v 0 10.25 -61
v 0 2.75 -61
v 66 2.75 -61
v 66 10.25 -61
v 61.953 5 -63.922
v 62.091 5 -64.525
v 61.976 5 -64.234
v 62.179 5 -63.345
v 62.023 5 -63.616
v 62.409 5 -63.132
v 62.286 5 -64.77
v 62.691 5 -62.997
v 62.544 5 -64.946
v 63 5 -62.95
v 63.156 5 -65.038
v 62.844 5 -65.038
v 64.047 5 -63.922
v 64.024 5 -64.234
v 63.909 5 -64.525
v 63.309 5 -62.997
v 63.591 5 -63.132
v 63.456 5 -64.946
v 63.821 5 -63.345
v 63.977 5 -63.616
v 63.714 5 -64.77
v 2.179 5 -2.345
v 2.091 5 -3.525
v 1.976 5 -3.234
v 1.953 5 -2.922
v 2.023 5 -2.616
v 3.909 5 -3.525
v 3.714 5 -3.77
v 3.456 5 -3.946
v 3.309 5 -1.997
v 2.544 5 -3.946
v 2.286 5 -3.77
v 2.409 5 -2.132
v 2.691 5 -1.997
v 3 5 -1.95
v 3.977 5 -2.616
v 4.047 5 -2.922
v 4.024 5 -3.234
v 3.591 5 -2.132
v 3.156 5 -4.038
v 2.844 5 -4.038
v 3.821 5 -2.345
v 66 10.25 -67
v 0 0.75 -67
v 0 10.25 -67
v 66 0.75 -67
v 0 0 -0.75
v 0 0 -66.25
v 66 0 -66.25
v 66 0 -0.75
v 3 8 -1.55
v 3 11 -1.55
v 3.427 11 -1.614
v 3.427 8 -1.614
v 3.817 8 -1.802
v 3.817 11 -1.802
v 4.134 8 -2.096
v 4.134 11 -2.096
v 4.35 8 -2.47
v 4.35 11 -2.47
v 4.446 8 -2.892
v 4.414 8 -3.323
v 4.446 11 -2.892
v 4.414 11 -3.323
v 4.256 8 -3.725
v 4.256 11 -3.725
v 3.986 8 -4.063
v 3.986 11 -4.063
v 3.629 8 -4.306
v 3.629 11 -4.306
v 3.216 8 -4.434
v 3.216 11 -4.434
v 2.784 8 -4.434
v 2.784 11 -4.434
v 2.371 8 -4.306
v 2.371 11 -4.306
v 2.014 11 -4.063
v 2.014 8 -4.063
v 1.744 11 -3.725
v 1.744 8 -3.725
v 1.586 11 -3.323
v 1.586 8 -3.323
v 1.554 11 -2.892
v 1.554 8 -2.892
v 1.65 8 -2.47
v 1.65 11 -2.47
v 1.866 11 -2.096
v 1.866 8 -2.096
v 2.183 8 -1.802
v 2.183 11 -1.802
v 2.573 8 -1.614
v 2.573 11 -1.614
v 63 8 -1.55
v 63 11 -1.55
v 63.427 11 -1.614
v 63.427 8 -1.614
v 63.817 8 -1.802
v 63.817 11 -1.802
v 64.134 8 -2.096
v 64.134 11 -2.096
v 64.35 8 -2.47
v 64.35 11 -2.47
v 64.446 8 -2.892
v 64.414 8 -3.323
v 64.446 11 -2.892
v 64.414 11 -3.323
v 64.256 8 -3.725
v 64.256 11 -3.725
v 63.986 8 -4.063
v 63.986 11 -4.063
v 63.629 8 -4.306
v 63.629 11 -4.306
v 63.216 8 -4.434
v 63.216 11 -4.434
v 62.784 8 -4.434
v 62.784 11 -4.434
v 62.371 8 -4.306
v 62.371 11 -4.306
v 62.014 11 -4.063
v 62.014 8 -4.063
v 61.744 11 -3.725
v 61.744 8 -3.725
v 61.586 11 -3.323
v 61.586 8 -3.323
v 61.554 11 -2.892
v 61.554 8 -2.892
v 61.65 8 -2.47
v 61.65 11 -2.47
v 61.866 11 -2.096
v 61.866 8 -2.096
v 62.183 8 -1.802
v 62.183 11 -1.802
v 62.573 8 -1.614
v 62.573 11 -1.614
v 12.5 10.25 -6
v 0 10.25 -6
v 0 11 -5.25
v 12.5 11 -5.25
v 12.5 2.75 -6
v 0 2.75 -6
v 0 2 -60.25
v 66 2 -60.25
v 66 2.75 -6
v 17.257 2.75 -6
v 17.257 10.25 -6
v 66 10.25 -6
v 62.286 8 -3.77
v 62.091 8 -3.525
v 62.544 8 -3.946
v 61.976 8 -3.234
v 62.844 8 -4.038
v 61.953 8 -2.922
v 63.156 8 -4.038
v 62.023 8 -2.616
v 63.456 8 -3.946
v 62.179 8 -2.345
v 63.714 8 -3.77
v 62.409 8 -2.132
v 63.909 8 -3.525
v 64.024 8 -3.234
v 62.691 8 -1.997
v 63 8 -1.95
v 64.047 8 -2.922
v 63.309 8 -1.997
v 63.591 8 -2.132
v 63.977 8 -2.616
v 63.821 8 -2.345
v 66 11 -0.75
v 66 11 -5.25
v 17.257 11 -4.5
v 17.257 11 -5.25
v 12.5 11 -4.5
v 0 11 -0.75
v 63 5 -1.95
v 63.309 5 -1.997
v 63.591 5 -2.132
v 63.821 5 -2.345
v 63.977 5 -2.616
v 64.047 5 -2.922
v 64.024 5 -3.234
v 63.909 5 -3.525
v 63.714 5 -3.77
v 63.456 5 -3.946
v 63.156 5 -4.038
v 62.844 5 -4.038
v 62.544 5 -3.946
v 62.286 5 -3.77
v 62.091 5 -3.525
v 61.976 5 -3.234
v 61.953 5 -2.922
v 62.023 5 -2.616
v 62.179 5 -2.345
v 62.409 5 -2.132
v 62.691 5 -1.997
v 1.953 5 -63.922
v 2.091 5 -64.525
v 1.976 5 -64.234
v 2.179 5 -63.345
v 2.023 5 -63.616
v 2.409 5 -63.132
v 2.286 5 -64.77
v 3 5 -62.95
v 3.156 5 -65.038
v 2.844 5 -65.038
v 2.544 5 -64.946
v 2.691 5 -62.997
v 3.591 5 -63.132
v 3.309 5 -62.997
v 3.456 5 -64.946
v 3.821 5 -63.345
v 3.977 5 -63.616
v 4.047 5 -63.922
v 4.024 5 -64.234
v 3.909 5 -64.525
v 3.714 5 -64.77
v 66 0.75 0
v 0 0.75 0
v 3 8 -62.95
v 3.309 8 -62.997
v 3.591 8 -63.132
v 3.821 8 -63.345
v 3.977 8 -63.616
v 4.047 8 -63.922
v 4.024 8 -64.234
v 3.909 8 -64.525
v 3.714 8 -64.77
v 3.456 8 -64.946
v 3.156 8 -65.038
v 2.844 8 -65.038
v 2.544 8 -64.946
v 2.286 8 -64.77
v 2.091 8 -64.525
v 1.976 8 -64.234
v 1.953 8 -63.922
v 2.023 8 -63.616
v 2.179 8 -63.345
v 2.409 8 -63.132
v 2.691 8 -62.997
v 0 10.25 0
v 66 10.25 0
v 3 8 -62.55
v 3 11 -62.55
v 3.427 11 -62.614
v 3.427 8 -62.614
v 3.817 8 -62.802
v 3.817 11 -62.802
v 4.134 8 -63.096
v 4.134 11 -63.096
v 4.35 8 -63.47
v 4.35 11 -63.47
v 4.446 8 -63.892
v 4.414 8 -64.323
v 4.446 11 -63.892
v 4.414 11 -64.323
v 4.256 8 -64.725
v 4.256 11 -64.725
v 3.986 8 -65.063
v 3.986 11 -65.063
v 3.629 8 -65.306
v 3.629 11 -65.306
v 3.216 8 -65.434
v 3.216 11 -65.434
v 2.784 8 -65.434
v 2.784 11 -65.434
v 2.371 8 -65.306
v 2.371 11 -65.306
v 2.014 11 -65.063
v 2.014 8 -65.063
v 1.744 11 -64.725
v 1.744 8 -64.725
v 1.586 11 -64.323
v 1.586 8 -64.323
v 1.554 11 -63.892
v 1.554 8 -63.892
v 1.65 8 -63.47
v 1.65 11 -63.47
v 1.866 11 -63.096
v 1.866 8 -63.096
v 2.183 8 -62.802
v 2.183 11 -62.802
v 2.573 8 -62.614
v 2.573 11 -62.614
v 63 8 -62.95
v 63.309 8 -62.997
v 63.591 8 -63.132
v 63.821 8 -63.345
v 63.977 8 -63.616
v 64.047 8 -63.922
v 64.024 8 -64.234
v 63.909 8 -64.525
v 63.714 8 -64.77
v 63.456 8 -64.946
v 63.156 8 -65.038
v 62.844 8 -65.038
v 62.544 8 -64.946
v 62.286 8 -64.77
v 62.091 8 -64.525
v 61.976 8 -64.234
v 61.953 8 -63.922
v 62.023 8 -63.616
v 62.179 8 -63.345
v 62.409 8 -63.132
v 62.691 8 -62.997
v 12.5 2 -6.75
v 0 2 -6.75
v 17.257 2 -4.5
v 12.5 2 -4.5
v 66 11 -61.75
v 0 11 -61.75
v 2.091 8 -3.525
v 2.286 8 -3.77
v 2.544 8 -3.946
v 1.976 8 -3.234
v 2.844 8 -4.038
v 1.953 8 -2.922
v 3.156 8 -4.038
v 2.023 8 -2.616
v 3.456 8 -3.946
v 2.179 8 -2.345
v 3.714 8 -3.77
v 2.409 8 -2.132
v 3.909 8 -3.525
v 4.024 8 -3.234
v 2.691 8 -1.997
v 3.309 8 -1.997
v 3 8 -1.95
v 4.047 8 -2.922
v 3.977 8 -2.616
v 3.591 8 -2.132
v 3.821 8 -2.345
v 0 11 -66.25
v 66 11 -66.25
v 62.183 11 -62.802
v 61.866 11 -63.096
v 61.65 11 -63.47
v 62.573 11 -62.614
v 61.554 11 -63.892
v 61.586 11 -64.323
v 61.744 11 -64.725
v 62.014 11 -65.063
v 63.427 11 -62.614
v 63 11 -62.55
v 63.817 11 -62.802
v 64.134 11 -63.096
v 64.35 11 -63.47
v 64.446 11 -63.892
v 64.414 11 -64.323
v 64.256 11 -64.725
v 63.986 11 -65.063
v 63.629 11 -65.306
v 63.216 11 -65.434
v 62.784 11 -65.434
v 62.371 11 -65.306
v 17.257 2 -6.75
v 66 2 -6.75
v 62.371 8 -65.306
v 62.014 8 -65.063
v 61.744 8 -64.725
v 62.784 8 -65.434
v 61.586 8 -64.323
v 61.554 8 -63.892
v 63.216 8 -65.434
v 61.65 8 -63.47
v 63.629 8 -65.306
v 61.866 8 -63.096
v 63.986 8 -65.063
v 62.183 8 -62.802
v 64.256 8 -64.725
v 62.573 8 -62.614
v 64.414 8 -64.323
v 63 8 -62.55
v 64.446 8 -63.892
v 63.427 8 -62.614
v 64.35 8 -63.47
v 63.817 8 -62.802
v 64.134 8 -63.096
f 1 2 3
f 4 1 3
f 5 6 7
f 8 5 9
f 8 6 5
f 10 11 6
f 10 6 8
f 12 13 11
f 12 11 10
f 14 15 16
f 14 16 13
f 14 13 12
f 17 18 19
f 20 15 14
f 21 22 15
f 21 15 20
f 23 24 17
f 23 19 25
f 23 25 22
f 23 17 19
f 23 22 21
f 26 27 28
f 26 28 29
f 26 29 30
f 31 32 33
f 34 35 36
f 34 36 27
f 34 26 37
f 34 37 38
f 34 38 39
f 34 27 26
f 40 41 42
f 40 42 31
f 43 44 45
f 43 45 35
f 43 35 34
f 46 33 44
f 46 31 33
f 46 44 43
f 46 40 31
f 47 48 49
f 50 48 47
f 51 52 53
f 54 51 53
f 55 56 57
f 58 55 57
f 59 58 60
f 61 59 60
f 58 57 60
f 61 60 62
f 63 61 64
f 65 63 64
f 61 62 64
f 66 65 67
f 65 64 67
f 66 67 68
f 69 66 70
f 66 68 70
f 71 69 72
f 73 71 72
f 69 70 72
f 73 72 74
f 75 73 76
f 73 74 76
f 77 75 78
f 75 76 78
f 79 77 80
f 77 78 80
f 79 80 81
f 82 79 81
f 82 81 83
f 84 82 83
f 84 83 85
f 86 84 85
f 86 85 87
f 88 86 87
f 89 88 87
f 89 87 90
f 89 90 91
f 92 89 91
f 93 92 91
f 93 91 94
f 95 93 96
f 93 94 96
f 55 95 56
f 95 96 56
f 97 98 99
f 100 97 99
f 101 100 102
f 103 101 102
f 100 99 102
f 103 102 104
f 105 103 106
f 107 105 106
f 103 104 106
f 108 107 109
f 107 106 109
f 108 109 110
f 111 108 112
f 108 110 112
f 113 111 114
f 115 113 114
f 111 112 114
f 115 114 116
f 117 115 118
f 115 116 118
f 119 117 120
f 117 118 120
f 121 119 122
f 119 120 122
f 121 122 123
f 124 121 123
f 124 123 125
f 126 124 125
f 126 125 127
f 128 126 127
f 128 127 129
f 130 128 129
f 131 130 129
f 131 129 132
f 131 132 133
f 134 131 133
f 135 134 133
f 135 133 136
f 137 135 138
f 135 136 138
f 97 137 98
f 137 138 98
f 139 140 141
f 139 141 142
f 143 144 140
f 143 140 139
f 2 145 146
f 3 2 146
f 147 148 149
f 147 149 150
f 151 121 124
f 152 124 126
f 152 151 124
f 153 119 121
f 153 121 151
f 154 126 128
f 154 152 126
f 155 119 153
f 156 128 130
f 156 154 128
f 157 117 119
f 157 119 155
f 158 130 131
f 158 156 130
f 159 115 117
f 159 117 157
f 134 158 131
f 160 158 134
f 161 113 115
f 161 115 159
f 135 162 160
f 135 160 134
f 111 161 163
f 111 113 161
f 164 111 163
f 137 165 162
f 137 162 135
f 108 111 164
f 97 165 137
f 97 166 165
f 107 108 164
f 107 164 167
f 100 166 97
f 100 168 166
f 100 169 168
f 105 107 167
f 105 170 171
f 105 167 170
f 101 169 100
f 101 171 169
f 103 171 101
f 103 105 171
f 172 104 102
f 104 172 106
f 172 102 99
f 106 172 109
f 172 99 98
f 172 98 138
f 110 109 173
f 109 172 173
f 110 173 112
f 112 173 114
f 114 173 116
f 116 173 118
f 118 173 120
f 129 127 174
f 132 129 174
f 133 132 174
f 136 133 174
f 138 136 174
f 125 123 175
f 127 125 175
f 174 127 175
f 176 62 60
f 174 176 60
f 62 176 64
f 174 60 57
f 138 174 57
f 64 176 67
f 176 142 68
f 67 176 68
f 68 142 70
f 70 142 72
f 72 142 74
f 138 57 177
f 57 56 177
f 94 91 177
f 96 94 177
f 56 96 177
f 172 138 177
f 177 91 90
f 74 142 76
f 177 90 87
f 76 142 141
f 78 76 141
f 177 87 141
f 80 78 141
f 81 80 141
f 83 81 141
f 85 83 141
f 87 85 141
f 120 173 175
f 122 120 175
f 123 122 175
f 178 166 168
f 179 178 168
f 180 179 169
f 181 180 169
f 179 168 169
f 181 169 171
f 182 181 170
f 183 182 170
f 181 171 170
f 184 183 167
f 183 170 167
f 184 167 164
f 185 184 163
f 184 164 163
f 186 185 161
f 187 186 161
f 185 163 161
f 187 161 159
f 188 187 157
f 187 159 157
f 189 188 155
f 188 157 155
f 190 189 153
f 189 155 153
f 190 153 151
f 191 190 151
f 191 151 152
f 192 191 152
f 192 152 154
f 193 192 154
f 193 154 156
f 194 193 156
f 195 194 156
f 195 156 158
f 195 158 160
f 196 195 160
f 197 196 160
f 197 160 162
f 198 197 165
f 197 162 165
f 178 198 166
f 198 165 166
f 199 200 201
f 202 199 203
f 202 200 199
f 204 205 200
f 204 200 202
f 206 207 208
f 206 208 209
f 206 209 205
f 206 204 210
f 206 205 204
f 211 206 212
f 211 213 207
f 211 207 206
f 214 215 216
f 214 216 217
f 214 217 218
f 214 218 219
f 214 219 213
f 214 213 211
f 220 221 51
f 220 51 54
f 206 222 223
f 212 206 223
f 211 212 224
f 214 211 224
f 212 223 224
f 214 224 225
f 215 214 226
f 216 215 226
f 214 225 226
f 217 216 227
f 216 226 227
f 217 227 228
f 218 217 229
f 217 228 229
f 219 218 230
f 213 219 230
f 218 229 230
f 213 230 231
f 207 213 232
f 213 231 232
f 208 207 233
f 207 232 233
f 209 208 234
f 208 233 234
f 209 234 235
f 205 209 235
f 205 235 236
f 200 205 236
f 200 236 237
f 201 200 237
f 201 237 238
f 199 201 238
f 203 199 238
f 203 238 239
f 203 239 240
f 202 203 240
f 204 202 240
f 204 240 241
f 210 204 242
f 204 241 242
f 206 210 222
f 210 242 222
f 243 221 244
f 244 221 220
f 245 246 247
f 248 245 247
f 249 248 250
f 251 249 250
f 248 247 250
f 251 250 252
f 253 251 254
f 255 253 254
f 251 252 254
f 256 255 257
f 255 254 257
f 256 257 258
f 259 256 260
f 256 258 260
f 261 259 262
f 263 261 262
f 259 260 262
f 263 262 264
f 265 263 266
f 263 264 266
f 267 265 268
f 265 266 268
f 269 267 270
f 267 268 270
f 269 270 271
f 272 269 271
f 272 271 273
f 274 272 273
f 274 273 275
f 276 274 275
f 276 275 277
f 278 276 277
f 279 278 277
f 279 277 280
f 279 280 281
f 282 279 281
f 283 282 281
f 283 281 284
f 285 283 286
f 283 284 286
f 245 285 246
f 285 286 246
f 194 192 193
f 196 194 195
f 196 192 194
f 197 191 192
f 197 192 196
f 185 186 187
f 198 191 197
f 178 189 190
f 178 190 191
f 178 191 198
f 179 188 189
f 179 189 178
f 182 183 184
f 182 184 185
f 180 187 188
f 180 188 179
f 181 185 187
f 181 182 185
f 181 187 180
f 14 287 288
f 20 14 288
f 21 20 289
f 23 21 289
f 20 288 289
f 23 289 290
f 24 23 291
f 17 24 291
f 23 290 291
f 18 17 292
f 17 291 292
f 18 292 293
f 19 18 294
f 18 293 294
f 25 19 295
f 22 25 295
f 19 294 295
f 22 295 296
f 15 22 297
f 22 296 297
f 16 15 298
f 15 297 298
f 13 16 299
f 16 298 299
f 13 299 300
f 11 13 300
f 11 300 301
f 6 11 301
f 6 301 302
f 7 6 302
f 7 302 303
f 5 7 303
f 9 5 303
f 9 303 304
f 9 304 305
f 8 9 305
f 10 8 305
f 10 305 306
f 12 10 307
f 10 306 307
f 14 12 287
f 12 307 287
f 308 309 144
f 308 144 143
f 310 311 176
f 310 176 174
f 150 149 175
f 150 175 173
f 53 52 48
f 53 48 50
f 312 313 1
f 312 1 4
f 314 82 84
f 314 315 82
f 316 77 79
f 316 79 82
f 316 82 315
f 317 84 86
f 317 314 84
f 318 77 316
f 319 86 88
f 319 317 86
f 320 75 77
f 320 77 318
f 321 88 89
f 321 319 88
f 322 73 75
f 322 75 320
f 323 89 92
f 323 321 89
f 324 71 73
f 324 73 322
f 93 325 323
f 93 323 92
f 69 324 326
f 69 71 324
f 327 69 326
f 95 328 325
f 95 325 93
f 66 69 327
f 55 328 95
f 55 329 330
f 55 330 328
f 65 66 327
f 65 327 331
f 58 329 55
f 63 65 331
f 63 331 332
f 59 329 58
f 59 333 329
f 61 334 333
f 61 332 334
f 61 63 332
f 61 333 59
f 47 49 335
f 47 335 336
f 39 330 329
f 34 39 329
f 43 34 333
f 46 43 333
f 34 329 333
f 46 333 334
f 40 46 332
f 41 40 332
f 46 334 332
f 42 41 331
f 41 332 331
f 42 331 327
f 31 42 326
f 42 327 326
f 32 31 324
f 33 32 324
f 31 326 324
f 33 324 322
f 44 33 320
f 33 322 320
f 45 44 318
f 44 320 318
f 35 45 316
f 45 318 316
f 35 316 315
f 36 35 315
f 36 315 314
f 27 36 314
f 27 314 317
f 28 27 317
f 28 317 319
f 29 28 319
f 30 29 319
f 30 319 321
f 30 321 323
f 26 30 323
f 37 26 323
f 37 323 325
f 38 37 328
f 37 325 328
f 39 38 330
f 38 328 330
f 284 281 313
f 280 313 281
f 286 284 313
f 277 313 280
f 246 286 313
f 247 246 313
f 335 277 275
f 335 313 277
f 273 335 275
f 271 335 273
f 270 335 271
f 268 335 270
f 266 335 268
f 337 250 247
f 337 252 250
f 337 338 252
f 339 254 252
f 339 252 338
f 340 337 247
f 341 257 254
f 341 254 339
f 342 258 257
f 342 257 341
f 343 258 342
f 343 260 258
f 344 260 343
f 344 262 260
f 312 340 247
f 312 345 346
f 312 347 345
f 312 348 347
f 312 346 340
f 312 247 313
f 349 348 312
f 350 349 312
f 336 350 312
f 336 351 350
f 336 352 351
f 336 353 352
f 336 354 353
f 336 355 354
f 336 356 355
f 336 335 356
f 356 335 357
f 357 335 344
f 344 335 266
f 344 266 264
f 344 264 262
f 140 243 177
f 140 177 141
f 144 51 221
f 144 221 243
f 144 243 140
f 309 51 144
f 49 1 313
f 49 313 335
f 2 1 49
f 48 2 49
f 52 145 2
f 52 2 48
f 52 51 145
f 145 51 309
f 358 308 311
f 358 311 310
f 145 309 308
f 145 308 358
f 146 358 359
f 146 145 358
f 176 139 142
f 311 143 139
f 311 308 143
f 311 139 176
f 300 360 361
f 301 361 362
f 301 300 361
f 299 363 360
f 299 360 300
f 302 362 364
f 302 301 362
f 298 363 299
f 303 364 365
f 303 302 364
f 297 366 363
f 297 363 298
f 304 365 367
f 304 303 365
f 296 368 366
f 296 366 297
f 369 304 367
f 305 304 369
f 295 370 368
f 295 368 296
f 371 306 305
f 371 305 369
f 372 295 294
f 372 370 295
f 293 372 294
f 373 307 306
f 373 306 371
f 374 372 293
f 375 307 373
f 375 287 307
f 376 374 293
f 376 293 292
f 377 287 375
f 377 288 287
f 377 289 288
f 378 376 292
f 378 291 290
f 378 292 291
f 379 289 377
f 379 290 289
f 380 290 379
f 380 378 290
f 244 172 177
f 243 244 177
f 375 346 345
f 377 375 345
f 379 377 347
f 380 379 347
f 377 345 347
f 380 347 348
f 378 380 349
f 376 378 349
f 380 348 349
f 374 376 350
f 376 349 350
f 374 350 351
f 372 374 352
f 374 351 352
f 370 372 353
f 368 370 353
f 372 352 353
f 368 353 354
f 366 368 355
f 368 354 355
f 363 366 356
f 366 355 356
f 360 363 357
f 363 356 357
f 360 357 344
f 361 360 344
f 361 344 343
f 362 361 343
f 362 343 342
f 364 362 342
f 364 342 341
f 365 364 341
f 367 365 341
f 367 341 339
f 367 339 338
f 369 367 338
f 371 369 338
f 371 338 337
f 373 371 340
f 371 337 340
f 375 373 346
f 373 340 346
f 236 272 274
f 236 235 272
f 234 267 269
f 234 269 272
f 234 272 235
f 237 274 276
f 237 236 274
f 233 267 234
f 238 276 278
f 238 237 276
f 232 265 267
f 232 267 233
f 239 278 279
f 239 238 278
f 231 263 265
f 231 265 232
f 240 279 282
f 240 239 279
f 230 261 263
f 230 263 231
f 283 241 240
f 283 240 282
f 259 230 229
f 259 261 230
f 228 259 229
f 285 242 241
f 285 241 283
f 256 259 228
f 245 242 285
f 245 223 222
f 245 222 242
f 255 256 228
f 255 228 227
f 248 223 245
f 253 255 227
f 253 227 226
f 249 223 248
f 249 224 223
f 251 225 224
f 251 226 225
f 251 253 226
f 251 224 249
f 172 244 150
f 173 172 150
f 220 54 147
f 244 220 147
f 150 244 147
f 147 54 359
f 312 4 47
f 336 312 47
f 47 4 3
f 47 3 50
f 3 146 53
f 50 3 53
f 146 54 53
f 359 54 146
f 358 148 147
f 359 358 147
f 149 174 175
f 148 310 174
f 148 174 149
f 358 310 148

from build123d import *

# Parameters (mm, degrees)
SKETCH1_W           = 66
SKETCH1_H           = 67
BOSS_EXTRUDE1_DEPTH = 2
SKETCH2_W           = 66
SKETCH2_H           = 6
BOSS_EXTRUDE2_DEPTH = 9
SKETCH4_R           = 1.45
CUT_EXTRUDE1_DEPTH  = 3
SKETCH5_R           = 1.05
CUT_EXTRUDE2_DEPTH  = 3
CHAMFER1_SIZE       = 0.75


with BuildPart() as part:
    # Sketch1 → Boss-Extrude1 (new body)
    with BuildSketch(Plane(origin=(0, 0, 0), x_dir=(1, 0, 0), z_dir=(0, 1, 0))):
        with Locations((33, 33.5)):
            Rectangle(SKETCH1_W, SKETCH1_H)
    extrude(amount=BOSS_EXTRUDE1_DEPTH)

    # Sketch2 → Boss-Extrude2 (add)
    with BuildSketch(Plane(origin=(0, 2, 0), x_dir=(1, 0, 0), z_dir=(0, 1, 0))):
        with Locations((33, 64)):
            Rectangle(SKETCH2_W, SKETCH2_H)
        Polygon((17.257397729, 6), (66, 6), (66, 0), (0, 0), (0, 6), (12.5, 6), (12.5, 4.5), (17.257397729, 4.5), align=None)
    extrude(amount=BOSS_EXTRUDE2_DEPTH)

    # Sketch4 → Cut-Extrude1 (cut)
    with BuildSketch(Plane(origin=(0, 11, 0), x_dir=(1, 0, 0), z_dir=(0, 1, 0))):
        with Locations(Location((3, 64, 0), (0, 0, 270))):
            Circle(SKETCH4_R)
        with Locations(Location((63, 64, 0), (0, 0, 270))):
            Circle(SKETCH4_R)
        with Locations(Location((63, 3, 0), (0, 0, 270))):
            Circle(SKETCH4_R)
        with Locations(Location((3, 3, 0), (0, 0, 270))):
            Circle(SKETCH4_R)
    extrude(amount=-CUT_EXTRUDE1_DEPTH, mode=Mode.SUBTRACT)

    # Sketch5 → Cut-Extrude2 (cut)
    with BuildSketch(Plane(origin=(0, 8, 0), x_dir=(1, 0, 0), z_dir=(0, 1, 0))):
        with Locations(Location((3, 64, 0), (0, 0, 270))):
            Circle(SKETCH5_R)
        with Locations(Location((63, 64, 0), (0, 0, 270))):
            Circle(SKETCH5_R)
        with Locations(Location((63, 3, 0), (0, 0, 270))):
            Circle(SKETCH5_R)
        with Locations(Location((3, 3, 0), (0, 0, 270))):
            Circle(SKETCH5_R)
    extrude(amount=-CUT_EXTRUDE2_DEPTH, mode=Mode.SUBTRACT)

    # Chamfer1
    chamfer1_edges = [part.edges().sort_by_distance(p)[0] for p in [
        (33, 2, -61),
        (33, 11, -61),
        (33, 11, -67),
        (41.628698864, 2, -6),
        (6.25, 2, -6),
        (33, 11, 0),
        (41.628698864, 11, -6),
        (6.25, 11, -6),
        (33, 0, -67),
        (33, 0, 0),
    ]]
    chamfer(chamfer1_edges, length=CHAMFER1_SIZE)


solid = part.part
